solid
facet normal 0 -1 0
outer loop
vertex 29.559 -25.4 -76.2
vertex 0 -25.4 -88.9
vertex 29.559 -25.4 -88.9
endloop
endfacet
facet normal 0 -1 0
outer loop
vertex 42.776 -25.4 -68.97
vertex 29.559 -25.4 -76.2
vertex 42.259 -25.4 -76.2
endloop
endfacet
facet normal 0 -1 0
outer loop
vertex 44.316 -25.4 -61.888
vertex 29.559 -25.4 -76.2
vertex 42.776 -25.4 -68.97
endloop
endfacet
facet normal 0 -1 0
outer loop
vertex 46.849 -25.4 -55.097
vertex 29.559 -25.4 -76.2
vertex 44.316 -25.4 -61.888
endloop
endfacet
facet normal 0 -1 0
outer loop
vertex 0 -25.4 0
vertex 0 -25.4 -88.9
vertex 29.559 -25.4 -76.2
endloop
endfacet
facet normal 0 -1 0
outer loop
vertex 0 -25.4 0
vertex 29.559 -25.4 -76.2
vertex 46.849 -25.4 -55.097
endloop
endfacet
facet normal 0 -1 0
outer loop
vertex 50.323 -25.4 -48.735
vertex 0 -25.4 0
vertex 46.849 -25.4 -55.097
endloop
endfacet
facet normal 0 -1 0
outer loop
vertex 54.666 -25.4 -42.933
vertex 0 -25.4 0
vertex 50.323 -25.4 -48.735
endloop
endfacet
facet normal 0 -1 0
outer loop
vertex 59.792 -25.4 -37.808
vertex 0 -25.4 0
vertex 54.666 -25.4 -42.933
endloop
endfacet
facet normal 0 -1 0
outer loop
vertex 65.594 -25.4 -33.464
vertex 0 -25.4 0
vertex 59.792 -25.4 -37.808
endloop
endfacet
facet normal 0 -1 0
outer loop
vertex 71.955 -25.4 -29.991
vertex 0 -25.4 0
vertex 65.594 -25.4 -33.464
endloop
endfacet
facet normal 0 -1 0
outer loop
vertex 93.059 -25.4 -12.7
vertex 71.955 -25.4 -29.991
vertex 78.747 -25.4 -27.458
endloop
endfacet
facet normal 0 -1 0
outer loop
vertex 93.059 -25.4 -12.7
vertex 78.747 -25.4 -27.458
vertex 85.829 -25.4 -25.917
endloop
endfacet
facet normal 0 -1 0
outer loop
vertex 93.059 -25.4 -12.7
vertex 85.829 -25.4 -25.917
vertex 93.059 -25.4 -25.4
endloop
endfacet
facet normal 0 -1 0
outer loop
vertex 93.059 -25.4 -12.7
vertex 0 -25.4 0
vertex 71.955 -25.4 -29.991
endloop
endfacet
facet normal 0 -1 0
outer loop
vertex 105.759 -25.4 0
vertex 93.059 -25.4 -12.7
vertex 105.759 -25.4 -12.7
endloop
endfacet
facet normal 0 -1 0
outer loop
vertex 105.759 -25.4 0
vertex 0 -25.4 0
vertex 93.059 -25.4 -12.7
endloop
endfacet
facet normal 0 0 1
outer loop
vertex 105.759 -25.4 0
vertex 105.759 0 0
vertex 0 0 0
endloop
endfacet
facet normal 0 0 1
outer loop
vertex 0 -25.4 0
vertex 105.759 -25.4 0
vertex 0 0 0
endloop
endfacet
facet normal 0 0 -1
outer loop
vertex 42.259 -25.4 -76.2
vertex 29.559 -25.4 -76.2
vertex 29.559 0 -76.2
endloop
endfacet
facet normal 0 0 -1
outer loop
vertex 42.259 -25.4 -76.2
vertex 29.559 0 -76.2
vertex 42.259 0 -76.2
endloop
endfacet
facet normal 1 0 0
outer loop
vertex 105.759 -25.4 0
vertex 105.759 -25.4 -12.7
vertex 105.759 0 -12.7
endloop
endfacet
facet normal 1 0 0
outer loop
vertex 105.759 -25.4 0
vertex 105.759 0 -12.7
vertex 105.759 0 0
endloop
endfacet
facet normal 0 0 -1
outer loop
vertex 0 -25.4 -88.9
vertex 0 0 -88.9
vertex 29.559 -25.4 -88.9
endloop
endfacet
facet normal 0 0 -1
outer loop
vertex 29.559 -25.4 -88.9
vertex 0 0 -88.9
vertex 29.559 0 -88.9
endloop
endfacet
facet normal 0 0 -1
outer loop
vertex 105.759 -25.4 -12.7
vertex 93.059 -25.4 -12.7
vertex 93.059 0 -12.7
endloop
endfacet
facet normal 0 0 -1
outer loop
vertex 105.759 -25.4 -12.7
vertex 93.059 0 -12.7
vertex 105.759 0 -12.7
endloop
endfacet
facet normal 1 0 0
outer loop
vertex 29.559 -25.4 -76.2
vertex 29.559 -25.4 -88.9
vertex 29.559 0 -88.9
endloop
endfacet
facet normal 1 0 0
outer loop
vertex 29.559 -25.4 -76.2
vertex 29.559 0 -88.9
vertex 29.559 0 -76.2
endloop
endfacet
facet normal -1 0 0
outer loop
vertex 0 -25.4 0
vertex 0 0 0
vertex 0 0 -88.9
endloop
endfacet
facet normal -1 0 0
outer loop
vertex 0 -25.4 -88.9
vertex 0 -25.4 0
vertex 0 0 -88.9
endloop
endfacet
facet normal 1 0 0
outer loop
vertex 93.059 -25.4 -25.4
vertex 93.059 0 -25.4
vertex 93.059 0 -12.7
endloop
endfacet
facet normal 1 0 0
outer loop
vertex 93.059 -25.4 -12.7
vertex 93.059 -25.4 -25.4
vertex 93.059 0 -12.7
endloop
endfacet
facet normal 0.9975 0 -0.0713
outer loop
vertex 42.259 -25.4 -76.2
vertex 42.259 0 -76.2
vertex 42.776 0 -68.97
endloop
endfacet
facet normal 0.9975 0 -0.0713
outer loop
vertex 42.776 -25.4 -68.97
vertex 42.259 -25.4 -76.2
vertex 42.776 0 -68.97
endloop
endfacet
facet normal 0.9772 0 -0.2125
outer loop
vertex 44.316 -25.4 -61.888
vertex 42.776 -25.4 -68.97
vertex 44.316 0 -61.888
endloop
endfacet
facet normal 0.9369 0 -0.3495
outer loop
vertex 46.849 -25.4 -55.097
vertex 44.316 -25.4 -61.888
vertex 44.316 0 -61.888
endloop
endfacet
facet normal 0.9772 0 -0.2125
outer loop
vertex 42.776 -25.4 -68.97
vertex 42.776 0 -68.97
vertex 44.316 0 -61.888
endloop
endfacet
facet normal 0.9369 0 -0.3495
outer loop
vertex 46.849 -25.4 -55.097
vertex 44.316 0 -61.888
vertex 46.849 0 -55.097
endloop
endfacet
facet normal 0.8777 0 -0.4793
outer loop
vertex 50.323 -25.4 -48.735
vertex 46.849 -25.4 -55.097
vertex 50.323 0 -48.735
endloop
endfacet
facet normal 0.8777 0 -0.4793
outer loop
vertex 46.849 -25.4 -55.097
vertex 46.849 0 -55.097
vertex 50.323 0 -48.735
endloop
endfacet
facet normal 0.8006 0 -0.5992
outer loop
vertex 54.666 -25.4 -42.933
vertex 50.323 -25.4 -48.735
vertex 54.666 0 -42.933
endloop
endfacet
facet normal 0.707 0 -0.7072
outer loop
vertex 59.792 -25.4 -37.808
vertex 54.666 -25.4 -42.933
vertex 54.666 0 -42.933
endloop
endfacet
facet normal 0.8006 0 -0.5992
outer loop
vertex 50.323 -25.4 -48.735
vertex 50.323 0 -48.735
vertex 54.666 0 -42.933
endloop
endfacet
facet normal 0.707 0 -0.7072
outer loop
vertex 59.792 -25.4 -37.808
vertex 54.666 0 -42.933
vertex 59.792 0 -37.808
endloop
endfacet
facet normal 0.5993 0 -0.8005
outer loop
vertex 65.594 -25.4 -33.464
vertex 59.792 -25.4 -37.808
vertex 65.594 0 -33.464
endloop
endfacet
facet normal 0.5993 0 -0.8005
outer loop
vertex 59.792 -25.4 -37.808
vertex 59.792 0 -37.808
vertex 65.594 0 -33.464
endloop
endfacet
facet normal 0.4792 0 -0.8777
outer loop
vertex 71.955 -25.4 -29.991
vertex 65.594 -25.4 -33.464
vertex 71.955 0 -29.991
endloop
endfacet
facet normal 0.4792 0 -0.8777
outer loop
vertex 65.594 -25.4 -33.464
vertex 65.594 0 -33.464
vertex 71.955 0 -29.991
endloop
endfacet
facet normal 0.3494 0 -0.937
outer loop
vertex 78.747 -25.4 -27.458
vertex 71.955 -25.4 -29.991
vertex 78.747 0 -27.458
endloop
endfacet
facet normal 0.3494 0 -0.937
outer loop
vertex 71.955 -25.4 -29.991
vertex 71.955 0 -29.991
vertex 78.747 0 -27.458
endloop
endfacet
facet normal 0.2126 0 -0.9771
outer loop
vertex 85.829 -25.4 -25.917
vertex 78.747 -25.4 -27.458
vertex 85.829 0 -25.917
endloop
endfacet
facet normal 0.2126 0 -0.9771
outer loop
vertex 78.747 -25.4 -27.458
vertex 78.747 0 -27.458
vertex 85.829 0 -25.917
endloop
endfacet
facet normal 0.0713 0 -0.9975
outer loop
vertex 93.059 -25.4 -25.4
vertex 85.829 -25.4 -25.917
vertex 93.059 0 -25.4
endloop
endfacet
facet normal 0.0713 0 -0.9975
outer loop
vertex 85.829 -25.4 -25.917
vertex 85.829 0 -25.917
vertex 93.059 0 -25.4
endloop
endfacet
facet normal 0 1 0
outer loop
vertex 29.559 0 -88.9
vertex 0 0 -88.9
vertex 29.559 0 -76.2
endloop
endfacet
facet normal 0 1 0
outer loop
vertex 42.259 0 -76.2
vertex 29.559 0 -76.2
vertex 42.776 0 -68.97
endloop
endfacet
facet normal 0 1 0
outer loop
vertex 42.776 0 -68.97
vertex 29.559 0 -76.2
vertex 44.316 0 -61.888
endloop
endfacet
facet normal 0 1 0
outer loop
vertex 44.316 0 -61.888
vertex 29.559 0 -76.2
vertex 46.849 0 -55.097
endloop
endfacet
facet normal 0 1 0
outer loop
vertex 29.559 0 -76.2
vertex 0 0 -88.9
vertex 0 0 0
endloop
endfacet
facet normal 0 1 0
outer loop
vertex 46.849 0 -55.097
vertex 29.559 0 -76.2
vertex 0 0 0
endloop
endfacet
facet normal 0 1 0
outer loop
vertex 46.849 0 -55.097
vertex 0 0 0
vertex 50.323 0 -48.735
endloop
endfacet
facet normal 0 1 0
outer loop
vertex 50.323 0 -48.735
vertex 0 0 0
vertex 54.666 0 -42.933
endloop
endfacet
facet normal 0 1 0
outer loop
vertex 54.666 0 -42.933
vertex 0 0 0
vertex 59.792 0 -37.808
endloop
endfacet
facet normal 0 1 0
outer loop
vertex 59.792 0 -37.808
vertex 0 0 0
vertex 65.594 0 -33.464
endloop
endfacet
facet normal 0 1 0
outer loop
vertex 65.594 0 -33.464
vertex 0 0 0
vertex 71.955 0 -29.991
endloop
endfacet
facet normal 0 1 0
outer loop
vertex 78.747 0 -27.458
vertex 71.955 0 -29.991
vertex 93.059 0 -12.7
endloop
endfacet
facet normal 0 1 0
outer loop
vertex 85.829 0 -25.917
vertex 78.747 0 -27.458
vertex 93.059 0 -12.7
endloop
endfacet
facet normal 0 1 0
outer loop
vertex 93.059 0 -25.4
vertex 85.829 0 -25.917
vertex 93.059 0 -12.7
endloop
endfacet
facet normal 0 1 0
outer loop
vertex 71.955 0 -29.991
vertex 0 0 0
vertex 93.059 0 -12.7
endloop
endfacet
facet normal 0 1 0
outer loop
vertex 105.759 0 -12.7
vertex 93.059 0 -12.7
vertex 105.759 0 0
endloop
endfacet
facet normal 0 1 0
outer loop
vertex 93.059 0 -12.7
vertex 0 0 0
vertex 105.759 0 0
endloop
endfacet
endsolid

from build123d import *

# Parameters (mm, degrees)
F1_DEPTH = 25.4


with BuildPart() as f1:
    # F0 (on Front) → F1 (new body)
    with BuildSketch(Plane.XZ):
        with BuildLine():
            Line((105.758528, 0), (0, 0))
            Line((0, 0), (0, -88.9))
            Line((0, -88.9), (29.558528, -88.9))
            Line((29.558528, -88.9), (29.558528, -76.2))
            Line((29.558528, -76.2), (42.258528, -76.2))
            ThreePointArc((42.258528, -76.2), (57.137504, -40.278976), (93.058528, -25.4))
            Line((93.058528, -25.4), (93.058528, -12.7))
            Line((93.058528, -12.7), (105.758528, -12.7))
            Line((105.758528, -12.7), (105.758528, 0))
        make_face()
    extrude(amount=F1_DEPTH)


solid = f1.part
